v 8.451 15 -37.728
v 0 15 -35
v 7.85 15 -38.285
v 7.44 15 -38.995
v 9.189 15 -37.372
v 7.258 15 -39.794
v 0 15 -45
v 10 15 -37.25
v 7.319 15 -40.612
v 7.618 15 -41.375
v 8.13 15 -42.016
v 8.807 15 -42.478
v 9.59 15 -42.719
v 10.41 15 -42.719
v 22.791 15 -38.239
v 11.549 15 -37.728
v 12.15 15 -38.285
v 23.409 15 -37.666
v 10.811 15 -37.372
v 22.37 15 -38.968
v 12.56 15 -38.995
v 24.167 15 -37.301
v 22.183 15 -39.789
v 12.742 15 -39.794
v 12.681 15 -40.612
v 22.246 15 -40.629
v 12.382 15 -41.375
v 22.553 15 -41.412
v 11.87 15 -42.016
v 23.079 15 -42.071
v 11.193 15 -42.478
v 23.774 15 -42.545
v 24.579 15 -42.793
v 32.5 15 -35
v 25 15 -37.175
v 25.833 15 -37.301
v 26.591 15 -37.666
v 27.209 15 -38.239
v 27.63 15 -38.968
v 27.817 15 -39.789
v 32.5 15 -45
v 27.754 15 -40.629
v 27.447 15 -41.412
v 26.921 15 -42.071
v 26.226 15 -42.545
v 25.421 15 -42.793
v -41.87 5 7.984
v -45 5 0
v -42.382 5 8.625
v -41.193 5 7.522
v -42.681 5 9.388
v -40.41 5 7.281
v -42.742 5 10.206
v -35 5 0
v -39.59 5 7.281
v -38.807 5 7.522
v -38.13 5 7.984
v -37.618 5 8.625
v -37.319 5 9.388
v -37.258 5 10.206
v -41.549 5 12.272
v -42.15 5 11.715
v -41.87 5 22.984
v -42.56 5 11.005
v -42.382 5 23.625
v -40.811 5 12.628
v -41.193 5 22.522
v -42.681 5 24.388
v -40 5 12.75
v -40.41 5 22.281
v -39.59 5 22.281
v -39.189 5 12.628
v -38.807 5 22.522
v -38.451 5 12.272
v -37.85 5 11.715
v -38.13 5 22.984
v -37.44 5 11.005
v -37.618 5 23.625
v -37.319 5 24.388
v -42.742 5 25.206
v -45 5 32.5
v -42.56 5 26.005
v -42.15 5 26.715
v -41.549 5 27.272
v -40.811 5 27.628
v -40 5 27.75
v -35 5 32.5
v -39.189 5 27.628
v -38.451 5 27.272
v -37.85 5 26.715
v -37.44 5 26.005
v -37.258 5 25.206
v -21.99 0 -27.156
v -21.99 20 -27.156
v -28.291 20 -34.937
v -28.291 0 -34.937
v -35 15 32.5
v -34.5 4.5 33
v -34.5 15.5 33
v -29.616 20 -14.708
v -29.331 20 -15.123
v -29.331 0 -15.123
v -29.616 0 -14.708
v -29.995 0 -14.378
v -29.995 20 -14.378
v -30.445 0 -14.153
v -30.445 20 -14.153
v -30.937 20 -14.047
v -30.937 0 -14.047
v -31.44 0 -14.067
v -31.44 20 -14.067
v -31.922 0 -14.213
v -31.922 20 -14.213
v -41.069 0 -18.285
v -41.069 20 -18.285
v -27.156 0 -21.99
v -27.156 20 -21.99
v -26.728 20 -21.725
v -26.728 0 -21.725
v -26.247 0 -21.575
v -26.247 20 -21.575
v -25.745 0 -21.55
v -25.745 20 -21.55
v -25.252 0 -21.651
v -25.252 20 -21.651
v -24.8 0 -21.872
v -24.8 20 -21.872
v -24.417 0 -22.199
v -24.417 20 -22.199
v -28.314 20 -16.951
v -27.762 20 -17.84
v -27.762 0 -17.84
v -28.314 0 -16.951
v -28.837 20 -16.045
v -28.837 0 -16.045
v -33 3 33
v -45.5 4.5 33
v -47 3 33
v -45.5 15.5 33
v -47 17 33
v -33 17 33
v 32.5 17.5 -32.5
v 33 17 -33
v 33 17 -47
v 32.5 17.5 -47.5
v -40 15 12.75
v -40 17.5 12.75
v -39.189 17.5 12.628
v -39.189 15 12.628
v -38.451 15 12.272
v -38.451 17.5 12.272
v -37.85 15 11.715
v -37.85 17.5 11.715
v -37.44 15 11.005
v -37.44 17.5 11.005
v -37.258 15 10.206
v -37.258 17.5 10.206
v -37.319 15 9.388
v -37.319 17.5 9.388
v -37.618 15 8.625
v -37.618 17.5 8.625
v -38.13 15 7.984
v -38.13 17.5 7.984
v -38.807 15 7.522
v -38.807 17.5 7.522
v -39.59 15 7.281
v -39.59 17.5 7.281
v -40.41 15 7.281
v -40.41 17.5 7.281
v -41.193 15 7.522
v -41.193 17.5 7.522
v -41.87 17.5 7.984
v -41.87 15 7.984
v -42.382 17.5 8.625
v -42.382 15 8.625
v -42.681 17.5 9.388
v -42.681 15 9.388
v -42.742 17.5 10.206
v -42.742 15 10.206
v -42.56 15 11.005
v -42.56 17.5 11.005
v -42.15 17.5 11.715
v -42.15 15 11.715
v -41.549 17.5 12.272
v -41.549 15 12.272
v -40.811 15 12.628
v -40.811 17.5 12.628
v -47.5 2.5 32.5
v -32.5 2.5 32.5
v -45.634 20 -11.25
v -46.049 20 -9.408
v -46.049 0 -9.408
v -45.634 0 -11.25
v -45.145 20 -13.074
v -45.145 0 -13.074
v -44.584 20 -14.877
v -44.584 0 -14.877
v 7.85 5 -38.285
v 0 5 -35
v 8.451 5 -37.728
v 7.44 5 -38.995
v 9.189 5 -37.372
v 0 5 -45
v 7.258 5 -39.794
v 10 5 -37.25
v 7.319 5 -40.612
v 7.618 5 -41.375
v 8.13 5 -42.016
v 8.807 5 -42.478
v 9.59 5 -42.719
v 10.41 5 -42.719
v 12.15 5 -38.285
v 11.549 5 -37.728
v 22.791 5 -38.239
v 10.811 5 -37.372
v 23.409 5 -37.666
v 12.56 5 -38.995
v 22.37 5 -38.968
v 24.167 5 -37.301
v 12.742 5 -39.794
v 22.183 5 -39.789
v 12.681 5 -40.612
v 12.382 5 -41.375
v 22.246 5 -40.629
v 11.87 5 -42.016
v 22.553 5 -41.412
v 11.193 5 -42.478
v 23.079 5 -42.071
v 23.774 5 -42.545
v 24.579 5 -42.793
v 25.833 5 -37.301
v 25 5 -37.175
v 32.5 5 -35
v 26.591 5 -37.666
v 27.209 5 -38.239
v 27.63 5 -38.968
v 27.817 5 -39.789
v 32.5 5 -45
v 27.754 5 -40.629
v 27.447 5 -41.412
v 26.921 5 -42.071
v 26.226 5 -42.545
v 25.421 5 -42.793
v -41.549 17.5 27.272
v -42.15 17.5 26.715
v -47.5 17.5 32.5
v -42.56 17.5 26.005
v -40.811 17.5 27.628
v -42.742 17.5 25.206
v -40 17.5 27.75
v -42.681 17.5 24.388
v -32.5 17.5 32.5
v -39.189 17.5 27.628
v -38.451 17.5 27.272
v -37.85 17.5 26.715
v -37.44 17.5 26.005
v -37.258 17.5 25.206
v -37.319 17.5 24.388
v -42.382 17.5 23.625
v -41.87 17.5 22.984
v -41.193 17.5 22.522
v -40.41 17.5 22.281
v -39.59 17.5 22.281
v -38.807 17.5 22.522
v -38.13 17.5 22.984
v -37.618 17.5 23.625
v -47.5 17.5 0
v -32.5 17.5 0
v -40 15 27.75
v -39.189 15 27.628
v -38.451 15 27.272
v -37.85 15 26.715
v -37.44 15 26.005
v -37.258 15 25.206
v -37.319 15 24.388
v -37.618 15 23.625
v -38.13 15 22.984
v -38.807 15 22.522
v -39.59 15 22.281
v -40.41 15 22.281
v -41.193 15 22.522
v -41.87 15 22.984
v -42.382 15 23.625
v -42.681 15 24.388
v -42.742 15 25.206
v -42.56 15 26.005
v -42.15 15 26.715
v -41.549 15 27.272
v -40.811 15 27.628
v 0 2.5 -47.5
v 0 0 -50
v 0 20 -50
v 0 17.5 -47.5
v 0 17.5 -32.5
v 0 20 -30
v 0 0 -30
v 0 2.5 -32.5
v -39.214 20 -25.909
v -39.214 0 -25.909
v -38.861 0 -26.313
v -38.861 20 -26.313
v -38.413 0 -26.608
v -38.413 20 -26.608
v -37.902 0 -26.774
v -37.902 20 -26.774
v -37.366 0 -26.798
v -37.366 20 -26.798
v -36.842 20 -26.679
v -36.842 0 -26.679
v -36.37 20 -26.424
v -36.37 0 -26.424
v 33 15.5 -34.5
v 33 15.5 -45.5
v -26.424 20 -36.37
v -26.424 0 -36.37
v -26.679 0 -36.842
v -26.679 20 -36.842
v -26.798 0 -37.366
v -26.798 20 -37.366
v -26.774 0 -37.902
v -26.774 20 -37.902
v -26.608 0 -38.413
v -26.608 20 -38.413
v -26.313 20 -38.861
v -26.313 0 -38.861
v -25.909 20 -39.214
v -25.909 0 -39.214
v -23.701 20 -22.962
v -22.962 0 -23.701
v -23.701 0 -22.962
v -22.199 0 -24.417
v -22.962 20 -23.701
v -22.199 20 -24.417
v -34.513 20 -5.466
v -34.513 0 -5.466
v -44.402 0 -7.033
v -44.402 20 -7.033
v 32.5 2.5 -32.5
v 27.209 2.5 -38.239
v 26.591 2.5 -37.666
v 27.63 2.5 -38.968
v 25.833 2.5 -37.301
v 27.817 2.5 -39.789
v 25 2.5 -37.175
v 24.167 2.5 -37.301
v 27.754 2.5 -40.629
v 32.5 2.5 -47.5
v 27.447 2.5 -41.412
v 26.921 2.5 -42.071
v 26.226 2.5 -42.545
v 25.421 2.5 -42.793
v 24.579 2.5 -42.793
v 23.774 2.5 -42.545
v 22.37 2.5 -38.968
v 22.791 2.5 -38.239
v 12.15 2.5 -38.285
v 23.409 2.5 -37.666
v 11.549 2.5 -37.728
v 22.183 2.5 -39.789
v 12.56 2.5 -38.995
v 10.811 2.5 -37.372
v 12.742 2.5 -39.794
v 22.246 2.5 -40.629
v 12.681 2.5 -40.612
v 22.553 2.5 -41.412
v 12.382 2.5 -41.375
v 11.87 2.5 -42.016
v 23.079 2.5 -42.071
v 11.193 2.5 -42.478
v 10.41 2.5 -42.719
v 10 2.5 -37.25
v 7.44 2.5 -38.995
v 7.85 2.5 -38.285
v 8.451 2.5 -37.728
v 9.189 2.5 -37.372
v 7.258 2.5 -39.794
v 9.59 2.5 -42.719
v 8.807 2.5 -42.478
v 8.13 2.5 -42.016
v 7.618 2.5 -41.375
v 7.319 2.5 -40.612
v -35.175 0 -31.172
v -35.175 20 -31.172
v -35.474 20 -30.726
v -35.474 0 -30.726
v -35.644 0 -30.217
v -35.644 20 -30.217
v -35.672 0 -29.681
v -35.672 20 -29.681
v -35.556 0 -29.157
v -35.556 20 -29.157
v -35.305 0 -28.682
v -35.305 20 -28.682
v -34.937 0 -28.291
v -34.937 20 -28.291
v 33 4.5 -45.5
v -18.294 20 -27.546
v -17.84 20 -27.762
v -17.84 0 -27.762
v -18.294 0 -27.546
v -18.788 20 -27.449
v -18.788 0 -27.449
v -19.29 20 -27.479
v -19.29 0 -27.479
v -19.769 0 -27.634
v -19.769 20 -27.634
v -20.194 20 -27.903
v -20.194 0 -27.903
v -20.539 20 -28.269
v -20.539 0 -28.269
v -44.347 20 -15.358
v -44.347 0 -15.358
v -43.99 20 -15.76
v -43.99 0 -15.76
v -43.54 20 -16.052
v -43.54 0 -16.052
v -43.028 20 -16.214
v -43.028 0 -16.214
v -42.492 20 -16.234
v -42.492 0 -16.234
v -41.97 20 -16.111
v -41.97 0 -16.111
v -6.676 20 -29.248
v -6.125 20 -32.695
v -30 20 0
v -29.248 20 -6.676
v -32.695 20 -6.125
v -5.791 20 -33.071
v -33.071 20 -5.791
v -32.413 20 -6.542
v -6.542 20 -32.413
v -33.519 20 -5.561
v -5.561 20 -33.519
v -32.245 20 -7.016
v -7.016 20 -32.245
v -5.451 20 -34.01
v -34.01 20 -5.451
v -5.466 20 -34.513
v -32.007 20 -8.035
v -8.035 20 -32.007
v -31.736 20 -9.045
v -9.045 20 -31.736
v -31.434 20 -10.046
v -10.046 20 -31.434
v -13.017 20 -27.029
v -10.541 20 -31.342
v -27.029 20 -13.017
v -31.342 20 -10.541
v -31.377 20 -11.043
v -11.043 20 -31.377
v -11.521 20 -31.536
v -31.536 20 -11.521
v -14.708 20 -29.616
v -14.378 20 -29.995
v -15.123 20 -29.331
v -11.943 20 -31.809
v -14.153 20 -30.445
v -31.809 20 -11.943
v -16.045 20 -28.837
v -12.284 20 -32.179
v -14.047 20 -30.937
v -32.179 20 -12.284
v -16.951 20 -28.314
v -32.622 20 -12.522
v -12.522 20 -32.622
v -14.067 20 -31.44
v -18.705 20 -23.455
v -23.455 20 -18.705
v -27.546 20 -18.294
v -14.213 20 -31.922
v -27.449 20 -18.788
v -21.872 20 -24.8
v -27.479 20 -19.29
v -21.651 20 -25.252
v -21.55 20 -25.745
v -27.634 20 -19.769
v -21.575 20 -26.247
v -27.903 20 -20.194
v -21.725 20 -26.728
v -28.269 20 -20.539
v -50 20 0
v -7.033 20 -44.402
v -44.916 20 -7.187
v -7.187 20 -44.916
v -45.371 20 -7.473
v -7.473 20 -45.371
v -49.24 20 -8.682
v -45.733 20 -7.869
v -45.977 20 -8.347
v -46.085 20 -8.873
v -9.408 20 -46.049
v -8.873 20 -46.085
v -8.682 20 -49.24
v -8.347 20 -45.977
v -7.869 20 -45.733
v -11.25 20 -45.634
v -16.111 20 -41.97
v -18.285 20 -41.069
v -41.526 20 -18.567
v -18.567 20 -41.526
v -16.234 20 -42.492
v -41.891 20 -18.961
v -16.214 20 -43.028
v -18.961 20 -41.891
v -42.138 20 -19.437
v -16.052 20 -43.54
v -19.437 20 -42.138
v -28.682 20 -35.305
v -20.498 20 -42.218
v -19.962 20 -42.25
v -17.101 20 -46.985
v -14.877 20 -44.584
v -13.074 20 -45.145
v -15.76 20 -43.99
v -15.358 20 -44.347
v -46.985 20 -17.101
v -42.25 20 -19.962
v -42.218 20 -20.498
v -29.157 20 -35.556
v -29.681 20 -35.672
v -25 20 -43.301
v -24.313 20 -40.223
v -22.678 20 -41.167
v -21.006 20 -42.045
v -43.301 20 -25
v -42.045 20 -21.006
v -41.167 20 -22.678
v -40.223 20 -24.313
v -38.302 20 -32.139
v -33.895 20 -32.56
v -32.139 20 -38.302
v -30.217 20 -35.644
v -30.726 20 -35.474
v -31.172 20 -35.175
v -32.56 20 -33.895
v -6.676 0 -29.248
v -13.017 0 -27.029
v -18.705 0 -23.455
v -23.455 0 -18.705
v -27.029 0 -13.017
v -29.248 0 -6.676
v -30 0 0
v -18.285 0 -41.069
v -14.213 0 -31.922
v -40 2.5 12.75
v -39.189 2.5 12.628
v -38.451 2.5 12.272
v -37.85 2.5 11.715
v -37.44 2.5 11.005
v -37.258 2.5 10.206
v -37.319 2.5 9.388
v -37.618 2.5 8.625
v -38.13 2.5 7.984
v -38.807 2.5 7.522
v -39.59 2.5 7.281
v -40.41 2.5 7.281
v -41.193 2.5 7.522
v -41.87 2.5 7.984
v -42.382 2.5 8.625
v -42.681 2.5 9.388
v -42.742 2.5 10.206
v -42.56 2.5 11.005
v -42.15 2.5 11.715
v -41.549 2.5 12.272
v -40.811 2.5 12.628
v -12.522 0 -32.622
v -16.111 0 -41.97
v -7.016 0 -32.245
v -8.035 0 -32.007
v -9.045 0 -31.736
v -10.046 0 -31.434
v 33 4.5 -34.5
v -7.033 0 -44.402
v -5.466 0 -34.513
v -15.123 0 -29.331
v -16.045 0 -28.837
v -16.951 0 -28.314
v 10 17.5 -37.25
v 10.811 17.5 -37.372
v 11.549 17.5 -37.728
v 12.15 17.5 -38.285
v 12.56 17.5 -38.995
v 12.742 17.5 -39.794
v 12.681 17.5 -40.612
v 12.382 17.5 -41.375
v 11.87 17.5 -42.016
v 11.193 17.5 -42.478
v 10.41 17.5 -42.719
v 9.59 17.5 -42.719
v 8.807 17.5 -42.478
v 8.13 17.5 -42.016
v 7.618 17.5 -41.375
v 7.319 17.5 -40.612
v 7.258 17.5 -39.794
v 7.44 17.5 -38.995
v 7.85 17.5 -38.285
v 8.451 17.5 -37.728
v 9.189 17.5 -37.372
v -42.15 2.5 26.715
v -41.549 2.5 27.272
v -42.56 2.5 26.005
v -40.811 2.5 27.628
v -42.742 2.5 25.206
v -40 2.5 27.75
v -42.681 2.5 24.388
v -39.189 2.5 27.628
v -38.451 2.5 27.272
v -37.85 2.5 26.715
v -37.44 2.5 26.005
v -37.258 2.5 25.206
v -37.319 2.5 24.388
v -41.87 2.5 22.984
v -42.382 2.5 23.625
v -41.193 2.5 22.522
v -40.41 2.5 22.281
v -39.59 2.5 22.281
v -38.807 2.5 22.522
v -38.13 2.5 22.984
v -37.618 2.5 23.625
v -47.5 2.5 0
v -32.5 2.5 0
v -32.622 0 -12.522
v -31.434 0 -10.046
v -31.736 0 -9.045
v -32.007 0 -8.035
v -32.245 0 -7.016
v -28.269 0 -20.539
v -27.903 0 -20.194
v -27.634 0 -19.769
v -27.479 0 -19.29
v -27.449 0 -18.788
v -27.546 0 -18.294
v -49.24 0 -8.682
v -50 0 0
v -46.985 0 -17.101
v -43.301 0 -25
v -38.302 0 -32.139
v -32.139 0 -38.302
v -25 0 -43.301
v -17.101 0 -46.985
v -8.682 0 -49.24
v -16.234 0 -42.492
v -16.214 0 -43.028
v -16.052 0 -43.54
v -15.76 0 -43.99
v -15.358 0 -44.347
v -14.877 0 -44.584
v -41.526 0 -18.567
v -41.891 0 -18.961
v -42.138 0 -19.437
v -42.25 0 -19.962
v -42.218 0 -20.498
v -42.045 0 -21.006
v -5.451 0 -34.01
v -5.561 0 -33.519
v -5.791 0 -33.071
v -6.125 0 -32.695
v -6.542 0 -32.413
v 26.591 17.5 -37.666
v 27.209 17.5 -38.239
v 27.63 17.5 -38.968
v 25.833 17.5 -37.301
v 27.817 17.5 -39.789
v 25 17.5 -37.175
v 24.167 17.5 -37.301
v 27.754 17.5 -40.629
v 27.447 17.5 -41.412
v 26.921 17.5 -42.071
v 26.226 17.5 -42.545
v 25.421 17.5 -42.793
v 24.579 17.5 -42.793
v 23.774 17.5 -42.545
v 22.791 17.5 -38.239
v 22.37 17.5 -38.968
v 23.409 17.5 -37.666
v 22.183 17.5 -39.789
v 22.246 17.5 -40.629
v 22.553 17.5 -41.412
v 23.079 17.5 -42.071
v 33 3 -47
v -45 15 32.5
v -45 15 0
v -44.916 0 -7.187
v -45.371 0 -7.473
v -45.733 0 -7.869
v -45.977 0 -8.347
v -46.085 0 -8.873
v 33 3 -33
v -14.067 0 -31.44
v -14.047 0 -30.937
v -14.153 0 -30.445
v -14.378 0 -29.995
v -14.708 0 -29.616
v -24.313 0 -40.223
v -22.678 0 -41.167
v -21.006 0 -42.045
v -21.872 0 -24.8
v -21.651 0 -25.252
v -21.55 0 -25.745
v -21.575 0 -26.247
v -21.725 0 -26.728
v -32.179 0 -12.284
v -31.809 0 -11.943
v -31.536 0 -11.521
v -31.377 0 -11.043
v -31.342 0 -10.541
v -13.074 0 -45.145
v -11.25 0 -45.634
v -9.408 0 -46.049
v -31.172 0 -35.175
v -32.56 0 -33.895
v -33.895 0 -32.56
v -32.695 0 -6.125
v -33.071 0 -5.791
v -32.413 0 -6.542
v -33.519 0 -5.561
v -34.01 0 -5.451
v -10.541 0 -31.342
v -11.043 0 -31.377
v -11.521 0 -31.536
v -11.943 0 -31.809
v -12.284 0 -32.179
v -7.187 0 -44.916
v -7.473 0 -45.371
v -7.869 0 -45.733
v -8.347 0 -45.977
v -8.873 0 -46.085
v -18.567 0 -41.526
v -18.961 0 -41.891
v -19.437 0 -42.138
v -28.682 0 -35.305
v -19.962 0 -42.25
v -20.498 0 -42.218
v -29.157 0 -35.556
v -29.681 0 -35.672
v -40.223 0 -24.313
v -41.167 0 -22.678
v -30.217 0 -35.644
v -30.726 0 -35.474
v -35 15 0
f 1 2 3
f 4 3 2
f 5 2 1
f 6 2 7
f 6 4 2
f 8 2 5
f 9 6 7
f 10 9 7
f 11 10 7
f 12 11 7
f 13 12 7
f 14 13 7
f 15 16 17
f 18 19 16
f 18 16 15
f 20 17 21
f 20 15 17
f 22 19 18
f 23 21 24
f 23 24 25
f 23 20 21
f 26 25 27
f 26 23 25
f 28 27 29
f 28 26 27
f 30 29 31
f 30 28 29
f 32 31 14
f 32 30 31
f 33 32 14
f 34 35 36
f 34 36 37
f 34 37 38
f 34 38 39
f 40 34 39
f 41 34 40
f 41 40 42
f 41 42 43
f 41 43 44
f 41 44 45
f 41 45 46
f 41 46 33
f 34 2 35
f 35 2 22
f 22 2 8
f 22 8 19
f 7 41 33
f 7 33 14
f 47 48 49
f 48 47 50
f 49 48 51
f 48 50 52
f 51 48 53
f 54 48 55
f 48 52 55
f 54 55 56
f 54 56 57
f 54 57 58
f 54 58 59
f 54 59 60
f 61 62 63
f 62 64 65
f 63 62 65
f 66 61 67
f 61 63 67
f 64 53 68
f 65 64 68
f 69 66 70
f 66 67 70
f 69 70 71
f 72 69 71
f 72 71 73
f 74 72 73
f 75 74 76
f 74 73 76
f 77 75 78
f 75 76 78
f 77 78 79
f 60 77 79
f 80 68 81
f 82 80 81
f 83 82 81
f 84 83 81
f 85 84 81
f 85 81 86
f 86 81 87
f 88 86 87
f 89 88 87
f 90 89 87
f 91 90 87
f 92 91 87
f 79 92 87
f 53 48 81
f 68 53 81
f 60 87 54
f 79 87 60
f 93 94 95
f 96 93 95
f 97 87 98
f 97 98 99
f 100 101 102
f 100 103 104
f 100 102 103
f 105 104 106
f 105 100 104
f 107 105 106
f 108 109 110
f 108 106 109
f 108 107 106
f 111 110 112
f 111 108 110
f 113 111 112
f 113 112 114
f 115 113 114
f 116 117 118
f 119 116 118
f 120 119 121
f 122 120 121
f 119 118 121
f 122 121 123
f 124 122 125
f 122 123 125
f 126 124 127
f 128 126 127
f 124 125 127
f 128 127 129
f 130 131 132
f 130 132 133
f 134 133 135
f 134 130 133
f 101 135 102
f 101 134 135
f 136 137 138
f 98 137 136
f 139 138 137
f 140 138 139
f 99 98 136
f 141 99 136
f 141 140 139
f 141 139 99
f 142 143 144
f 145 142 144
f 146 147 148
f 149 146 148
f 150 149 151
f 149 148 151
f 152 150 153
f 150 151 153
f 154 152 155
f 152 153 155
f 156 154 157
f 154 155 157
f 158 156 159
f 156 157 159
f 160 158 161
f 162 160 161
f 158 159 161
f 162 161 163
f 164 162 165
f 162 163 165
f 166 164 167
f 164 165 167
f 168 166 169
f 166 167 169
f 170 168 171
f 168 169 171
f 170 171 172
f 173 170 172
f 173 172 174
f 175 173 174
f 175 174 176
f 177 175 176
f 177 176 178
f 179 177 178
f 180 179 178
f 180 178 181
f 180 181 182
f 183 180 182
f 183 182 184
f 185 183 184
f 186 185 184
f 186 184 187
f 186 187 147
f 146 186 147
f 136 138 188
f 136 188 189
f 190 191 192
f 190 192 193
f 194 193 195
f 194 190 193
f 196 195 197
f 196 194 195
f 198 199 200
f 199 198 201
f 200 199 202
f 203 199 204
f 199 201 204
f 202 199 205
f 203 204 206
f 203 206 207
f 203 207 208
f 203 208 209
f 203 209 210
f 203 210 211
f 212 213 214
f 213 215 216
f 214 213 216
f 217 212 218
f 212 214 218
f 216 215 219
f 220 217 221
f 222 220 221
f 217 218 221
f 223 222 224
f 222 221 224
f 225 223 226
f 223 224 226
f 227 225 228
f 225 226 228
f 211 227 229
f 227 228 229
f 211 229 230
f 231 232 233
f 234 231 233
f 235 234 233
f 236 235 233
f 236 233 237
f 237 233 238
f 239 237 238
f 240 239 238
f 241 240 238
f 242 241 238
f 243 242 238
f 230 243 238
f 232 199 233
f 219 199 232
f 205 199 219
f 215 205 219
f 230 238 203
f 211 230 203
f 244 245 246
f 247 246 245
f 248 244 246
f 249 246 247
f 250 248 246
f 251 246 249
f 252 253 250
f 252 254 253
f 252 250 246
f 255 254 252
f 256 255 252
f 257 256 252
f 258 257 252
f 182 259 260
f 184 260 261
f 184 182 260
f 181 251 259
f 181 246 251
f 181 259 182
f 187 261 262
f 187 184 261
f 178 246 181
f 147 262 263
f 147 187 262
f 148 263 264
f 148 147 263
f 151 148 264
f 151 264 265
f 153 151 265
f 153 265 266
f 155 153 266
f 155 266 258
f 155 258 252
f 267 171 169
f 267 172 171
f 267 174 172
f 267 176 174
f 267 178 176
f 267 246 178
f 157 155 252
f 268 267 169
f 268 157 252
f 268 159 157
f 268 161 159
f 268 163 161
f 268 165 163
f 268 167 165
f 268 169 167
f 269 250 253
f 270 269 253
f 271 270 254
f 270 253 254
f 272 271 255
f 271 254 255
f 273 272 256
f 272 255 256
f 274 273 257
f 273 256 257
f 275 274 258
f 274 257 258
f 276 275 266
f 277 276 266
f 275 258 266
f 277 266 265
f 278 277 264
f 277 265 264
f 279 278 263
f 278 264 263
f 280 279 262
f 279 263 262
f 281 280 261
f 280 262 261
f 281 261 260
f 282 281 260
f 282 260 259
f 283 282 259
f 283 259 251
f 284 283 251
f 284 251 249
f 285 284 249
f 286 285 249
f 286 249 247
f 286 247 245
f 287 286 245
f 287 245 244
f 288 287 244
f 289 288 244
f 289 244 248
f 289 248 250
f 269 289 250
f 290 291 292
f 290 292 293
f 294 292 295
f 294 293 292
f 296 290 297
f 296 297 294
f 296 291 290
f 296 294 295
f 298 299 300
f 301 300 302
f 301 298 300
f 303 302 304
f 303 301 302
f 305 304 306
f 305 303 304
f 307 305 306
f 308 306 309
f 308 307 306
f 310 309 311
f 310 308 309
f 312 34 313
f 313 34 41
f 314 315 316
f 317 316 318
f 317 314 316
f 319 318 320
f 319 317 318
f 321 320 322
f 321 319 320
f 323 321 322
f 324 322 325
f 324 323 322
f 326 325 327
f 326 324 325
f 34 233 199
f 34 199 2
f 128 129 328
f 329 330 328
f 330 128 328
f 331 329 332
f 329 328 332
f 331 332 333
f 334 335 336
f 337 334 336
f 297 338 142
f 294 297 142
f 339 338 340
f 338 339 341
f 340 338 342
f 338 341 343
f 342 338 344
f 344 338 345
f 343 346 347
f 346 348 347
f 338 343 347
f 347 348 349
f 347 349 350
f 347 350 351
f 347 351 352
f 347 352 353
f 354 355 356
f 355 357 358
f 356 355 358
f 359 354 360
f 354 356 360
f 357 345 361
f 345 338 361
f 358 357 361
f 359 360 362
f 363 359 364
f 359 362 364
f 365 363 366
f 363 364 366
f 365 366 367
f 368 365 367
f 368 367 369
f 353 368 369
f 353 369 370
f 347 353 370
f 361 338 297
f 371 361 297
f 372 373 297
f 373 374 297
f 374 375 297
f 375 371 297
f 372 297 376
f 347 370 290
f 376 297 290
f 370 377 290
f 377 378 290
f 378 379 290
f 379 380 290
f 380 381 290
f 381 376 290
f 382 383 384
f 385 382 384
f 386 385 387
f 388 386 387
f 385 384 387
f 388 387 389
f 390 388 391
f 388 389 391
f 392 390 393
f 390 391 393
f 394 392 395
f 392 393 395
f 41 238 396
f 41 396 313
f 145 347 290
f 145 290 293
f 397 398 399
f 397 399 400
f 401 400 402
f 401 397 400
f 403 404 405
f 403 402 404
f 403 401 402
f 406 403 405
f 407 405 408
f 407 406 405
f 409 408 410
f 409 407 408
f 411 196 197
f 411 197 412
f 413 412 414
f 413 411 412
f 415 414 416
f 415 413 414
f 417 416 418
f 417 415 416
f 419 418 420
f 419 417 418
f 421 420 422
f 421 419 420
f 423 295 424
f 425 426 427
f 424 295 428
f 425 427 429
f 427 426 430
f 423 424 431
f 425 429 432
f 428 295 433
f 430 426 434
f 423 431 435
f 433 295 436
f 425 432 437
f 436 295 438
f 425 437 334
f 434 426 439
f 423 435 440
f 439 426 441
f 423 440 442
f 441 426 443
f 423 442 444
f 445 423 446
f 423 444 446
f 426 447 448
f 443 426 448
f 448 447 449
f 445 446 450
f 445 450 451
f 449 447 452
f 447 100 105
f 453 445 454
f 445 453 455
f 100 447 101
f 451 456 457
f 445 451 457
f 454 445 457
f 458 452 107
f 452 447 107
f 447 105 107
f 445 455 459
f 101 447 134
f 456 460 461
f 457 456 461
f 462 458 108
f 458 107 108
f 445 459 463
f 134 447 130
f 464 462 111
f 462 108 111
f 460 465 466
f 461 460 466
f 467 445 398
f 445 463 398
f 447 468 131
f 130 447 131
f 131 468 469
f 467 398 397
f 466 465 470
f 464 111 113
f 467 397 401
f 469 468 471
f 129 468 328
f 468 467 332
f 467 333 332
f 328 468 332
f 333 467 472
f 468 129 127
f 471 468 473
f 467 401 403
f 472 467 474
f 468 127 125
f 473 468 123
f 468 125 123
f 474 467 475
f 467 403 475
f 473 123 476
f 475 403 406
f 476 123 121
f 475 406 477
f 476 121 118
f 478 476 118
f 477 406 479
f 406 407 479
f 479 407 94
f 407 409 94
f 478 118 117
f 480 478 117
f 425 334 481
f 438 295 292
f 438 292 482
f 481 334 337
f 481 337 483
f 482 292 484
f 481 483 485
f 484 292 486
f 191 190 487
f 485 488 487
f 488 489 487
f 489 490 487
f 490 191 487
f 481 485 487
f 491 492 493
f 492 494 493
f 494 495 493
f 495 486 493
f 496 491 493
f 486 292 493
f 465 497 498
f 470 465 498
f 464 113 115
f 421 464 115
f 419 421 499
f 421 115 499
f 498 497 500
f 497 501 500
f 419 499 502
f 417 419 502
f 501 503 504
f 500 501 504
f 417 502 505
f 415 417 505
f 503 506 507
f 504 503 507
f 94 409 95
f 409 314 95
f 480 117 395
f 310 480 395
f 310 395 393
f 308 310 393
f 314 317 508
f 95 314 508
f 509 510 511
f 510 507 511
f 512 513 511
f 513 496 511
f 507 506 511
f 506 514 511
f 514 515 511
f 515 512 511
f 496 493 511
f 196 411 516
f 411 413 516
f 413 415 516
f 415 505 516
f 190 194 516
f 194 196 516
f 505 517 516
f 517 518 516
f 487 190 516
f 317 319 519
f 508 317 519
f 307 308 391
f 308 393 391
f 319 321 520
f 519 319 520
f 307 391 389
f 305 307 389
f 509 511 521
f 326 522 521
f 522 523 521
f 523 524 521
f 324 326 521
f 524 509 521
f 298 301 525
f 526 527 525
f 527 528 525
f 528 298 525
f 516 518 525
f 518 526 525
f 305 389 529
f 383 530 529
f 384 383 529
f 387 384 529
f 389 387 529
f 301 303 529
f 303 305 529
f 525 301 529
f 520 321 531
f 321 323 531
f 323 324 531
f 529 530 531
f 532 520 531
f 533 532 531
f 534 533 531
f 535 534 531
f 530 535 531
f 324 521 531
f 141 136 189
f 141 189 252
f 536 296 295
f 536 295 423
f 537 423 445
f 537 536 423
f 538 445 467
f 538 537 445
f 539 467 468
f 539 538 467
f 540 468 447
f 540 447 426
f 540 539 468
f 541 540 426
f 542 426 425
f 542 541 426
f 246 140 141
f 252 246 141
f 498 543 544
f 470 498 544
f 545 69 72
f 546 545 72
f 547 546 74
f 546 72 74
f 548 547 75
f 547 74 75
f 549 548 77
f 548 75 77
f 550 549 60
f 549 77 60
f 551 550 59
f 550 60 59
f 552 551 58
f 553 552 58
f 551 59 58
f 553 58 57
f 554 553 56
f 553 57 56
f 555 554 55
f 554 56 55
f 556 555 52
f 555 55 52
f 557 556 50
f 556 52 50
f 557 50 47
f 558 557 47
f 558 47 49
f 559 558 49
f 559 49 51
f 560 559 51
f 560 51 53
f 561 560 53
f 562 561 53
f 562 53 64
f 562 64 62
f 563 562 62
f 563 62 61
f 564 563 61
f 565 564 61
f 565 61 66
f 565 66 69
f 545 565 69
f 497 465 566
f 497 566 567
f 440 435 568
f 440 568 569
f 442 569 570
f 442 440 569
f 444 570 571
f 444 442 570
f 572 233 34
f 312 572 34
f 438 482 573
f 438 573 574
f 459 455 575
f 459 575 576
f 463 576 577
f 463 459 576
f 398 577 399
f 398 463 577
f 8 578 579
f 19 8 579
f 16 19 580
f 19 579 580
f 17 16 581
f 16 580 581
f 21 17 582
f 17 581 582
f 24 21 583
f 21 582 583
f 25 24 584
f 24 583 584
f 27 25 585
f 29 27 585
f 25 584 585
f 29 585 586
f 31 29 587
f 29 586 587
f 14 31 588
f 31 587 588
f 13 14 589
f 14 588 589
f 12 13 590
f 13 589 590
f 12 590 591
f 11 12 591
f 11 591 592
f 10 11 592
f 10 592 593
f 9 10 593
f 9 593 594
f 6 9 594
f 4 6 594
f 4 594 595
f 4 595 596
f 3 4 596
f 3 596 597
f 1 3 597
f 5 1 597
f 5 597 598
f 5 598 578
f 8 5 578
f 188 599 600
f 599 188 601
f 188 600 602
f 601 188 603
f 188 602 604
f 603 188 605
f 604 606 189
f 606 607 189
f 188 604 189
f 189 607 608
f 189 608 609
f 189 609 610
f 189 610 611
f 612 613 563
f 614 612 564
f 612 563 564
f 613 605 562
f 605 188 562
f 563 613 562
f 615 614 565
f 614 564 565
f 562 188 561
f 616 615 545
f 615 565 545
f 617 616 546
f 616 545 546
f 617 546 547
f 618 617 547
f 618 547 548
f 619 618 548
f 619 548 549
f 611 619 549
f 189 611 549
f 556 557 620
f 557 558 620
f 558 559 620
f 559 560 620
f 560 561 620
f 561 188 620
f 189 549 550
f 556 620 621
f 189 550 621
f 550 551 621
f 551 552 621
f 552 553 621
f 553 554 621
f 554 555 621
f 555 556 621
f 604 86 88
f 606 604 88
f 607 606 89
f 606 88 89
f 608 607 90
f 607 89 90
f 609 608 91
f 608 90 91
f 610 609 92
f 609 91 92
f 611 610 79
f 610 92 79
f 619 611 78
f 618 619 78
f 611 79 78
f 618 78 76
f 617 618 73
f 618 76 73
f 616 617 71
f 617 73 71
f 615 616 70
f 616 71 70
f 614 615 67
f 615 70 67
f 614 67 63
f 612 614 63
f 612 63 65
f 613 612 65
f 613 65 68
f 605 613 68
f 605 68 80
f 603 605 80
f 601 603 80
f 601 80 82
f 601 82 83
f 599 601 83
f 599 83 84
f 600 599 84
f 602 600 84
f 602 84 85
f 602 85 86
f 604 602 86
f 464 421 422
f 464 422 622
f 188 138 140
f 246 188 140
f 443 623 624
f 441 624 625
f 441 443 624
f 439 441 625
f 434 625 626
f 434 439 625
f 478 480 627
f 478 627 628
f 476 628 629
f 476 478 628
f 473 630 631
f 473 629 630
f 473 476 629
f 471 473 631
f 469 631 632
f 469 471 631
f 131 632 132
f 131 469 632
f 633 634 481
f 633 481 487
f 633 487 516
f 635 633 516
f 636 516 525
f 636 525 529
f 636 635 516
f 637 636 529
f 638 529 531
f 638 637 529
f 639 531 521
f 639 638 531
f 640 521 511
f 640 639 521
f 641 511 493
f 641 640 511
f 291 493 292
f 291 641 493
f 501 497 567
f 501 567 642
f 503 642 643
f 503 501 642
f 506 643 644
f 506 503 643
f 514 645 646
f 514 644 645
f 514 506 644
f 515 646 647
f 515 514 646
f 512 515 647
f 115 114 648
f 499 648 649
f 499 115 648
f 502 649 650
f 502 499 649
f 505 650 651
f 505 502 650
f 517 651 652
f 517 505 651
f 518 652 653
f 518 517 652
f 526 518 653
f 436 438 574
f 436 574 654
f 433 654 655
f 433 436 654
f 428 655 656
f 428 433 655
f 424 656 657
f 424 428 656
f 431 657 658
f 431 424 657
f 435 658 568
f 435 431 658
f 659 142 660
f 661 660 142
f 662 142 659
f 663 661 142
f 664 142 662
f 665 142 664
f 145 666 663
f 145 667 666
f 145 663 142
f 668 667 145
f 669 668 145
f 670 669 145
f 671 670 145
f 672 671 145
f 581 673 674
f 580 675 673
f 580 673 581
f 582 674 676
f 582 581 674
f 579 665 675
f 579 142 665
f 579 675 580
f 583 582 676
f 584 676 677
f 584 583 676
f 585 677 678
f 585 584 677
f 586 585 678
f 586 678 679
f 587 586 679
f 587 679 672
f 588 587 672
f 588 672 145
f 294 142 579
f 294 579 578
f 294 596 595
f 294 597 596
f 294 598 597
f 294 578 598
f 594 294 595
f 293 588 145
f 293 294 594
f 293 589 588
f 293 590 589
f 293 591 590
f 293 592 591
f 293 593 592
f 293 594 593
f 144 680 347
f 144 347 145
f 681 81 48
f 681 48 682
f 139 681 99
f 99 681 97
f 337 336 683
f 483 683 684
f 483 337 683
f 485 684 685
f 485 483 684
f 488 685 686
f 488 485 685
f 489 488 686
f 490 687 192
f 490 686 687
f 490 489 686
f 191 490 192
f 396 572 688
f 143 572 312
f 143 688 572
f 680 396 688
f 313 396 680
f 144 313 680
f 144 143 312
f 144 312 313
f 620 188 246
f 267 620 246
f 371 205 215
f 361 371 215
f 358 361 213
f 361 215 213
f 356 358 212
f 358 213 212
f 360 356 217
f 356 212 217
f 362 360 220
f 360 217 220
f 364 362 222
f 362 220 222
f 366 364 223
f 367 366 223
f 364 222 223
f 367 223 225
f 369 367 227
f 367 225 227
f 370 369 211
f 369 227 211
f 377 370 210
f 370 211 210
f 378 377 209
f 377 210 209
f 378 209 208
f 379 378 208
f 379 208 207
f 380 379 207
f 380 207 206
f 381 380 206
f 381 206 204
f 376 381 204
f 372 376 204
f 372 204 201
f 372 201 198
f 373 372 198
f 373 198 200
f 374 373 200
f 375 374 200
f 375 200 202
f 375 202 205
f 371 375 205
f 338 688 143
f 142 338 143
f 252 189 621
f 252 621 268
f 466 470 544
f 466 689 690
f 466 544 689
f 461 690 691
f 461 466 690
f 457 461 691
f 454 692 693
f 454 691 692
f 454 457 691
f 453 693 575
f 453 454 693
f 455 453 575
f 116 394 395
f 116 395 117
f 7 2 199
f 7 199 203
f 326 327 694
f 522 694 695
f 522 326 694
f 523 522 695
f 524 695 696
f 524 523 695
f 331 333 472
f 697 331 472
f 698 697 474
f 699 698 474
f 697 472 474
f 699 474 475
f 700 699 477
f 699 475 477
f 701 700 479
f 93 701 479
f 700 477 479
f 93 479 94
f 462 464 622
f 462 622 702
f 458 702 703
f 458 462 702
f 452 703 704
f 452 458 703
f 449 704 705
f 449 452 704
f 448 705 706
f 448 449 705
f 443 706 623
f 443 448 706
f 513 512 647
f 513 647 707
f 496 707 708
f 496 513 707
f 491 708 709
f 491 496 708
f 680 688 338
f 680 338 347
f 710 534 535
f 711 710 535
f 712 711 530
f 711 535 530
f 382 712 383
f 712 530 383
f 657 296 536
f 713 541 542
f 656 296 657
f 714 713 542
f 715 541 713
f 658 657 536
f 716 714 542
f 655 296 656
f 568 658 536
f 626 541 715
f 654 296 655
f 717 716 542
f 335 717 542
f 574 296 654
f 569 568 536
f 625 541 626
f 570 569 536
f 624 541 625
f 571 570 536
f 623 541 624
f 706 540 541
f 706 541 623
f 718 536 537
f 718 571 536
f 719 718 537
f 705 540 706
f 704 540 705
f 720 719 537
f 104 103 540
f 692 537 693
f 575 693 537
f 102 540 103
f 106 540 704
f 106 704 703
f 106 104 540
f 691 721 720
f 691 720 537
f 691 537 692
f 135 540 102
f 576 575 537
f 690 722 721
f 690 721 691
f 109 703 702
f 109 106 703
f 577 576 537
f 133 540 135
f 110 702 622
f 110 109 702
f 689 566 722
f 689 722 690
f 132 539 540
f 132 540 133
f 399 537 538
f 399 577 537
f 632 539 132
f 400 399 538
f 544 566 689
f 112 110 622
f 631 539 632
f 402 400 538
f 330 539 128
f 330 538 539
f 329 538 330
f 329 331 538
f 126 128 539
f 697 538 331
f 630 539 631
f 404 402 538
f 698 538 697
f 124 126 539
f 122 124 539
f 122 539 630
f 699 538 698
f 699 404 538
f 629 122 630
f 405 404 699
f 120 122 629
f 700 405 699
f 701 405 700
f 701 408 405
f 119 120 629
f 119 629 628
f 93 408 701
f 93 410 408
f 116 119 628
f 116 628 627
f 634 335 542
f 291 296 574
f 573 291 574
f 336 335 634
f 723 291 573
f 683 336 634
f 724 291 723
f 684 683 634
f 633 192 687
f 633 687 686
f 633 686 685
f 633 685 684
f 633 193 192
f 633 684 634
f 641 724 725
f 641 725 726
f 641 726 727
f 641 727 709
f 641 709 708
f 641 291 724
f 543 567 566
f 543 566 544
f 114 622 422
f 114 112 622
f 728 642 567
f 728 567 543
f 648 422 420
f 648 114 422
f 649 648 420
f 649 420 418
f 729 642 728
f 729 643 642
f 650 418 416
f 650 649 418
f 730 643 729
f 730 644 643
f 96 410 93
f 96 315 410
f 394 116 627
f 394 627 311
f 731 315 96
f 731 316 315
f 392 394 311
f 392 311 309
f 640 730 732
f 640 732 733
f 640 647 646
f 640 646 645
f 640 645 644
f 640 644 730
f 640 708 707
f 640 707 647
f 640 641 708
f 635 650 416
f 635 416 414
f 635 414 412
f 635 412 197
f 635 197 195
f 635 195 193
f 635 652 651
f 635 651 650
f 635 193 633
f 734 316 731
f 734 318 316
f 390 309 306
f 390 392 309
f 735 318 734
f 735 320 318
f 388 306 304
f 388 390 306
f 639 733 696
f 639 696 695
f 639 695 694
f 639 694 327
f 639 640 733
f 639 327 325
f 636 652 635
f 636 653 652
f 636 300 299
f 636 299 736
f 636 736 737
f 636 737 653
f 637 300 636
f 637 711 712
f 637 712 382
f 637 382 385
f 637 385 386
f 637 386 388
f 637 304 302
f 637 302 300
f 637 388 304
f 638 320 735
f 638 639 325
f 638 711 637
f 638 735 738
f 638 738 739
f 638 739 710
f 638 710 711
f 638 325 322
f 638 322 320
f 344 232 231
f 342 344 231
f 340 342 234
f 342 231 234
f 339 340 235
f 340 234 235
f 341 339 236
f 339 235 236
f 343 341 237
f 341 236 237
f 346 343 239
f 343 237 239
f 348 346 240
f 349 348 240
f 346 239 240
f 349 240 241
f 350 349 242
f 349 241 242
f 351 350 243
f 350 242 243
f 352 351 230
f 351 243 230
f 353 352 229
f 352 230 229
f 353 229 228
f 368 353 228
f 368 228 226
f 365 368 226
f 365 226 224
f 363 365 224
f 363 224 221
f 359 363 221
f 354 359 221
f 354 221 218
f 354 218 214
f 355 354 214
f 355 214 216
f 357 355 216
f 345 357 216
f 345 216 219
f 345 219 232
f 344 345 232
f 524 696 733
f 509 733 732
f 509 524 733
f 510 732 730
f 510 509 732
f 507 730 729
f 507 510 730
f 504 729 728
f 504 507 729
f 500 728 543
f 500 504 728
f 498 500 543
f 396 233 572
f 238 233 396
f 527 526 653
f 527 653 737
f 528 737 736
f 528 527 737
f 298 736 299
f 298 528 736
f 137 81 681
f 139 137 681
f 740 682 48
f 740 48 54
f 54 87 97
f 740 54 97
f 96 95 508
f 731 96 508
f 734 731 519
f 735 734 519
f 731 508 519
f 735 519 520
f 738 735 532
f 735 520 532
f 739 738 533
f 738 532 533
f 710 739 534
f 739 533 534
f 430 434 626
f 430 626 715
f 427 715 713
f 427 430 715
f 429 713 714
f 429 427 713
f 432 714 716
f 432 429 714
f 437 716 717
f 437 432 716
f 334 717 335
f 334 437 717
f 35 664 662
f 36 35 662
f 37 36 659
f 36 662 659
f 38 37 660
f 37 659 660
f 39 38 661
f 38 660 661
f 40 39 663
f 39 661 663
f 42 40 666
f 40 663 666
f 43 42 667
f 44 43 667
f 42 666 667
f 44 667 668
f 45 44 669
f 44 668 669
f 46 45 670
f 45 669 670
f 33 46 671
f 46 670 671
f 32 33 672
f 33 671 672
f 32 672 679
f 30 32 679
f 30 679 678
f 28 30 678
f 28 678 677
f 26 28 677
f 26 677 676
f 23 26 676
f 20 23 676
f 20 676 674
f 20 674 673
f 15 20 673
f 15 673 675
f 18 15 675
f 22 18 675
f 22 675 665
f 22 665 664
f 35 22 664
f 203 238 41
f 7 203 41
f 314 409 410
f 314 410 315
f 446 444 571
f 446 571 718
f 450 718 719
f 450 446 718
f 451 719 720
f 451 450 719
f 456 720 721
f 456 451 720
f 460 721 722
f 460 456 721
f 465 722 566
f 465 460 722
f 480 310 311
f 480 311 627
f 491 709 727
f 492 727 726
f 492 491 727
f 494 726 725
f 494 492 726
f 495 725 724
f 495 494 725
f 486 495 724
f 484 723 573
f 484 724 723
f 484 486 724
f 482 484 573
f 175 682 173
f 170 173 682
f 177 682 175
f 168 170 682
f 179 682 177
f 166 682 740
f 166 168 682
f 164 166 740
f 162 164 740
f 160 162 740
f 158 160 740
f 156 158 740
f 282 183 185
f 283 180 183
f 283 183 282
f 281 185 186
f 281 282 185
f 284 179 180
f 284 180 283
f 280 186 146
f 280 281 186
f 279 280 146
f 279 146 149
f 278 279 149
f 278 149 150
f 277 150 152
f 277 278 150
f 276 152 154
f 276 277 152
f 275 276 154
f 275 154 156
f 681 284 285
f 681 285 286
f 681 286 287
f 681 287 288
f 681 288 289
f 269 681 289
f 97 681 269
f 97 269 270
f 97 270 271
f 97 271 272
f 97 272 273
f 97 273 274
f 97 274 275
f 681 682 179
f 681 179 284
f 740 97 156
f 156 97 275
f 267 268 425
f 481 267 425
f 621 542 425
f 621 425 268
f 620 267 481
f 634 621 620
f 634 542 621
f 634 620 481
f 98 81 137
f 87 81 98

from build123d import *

# Parameters (mm, degrees)
BOSS_EXTRUDE1_DEPTH = 20
SKETCH2_W           = 15
SKETCH2_H           = 15
BOSS_EXTRUDE2_DEPTH = 33
SKETCH3_W           = 15
SKETCH3_H           = 15
BOSS_EXTRUDE3_DEPTH = 33
SKETCH4_R           = 2.75
SKETCH4_R_2         = 2.825
CUT_EXTRUDE1_DEPTH  = 73.844011422
CUT_EXTRUDE2_DEPTH  = 74.484692283
SKETCH6_W           = 10
SKETCH6_H           = 10
CUT_EXTRUDE3_DEPTH  = 33
SKETCH7_W           = 10
SKETCH7_H           = 10
CUT_EXTRUDE4_DEPTH  = 33
CHAMFER1_SIZE       = 0.5


with BuildPart() as part:
    # Sketch1 → Boss-Extrude1 (new body)
    with BuildSketch(Plane(origin=(0, 0, 0), x_dir=(1, 0, 0), z_dir=(0, 1, 0))):
        with BuildLine():
            Line((0, 50), (0, 30))
            ThreePointArc((0, 30), (-21.213203436, 21.213203436), (-30, 0))
            Line((-30, 0), (-50, 0))
            ThreePointArc((-50, 0), (-35.355339059, 35.355339059), (0, 50))
        make_face()
    extrude(amount=BOSS_EXTRUDE1_DEPTH)

    # Sketch2 → Boss-Extrude2 (add)
    with BuildSketch(Plane.XY):
        with Locations((-40, 10)):
            Rectangle(SKETCH2_W, SKETCH2_H)
    extrude(amount=BOSS_EXTRUDE2_DEPTH)

    # Sketch3 → Boss-Extrude3 (add)
    with BuildSketch(Plane(origin=(0, 0, 0), x_dir=(0, 0, -1), z_dir=(1, 0, 0))):
        with Locations((40, 10)):
            Rectangle(SKETCH3_W, SKETCH3_H)
    extrude(amount=BOSS_EXTRUDE3_DEPTH)

    # Sketch4 → Cut-Extrude1 (cut, through all)
    with BuildSketch(Plane(origin=(0, 17.5, 0), x_dir=(1, 0, 0), z_dir=(0, 1, 0))):
        with Locations(Location((10, 40, 0), (0, 0, 270))):
            Circle(SKETCH4_R)
        with Locations(Location((25, 40, 0), (0, 0, 270))):
            Circle(SKETCH4_R_2)
        with Locations(Location((-40, -10, 0), (0, 0, 270))):
            Circle(SKETCH4_R)
        with Locations(Location((-40, -25, 0), (0, 0, 270))):
            Circle(SKETCH4_R)
    extrude(amount=-CUT_EXTRUDE1_DEPTH, mode=Mode.SUBTRACT)

    # Sketch5 → Cut-Extrude2 (cut, through all)
    with BuildSketch(Plane(origin=(0, 20, 0), x_dir=(1, 0, 0), z_dir=(0, 1, 0))):
        with BuildLine():
            Line((-21.990223117, 27.155663999), (-28.291433976, 34.937011371))
            ThreePointArc((-28.291433976, 34.937011371), (-29.68093252, 35.671569812), (-31.172202606, 35.17518706))
            ThreePointArc((-31.172202606, 35.17518706), (-33.234018716, 33.234018716), (-35.17518706, 31.172202606))
            ThreePointArc((-35.17518706, 31.172202606), (-35.671569812, 29.68093252), (-34.937011371, 28.291433976))
            Line((-34.937011371, 28.291433976), (-27.155663999, 21.990223117))
            ThreePointArc((-27.155663999, 21.990223117), (-25.744904759, 21.550308438), (-24.417193319, 22.199114181))
            ThreePointArc((-24.417193319, 22.199114181), (-23.334523779, 23.334523779), (-22.199114181, 24.417193319))
            ThreePointArc((-22.199114181, 24.417193319), (-21.550308438, 25.744904759), (-21.990223117, 27.155663999))
        make_face()
        with BuildLine():
            Line((-20.538868638, 28.26932746), (-26.424199651, 36.369790662))
            ThreePointArc((-26.424199651, 36.369790662), (-26.774099933, 37.902060905), (-25.908661914, 39.214043885))
            ThreePointArc((-25.908661914, 39.214043885), (-23.5, 40.703193978), (-21.006027233, 42.044581338))
            ThreePointArc((-21.006027233, 42.044581338), (-19.437097633, 42.138081158), (-18.285062818, 41.068923503))
            Line((-18.285062818, 41.068923503), (-14.21252141, 31.921845736))
            ThreePointArc((-14.21252141, 31.921845736), (-14.152727818, 30.445298653), (-15.123063049, 29.330751167))
            ThreePointArc((-15.123063049, 29.330751167), (-16.5, 28.578838325), (-17.839644098, 27.762332367))
            ThreePointArc((-17.839644098, 27.762332367), (-19.290038151, 27.47927115), (-20.538868638, 28.26932746))
        make_face()
        with BuildLine():
            Line((-12.522383321, 32.621923854), (-16.110622392, 41.969606219))
            ThreePointArc((-16.110622392, 41.969606219), (-16.05201939, 43.540226476), (-14.876504274, 44.583512878))
            ThreePointArc((-14.876504274, 44.583512878), (-12.16449512, 45.398513836), (-9.408325818, 46.04870688))
            ThreePointArc((-9.408325818, 46.04870688), (-7.868656664, 45.73295191), (-7.032594847, 44.402056368))
            Line((-7.032594847, 44.402056368), (-5.466259855, 34.512606439))
            ThreePointArc((-5.466259855, 34.512606439), (-5.790662187, 33.070895758), (-7.016400163, 32.245466794))
            ThreePointArc((-7.016400163, 32.245466794), (-8.541028488, 31.875552268), (-10.046352613, 31.433593482))
            ThreePointArc((-10.046352613, 31.433593482), (-11.52058732, 31.535566946), (-12.522383321, 32.621923854))
        make_face()
        with BuildLine():
            Line((-31.921845736, 14.21252141), (-41.068923503, 18.285062818))
            ThreePointArc((-41.068923503, 18.285062818), (-42.138081158, 19.437097633), (-42.044581338, 21.006027233))
            ThreePointArc((-42.044581338, 21.006027233), (-40.703193978, 23.5), (-39.214043885, 25.908661914))
            ThreePointArc((-39.214043885, 25.908661914), (-37.902060905, 26.774099933), (-36.369790662, 26.424199651))
            Line((-36.369790662, 26.424199651), (-28.26932746, 20.538868638))
            ThreePointArc((-28.26932746, 20.538868638), (-27.47927115, 19.290038151), (-27.762332367, 17.839644098))
            ThreePointArc((-27.762332367, 17.839644098), (-28.578838325, 16.5), (-29.330751167, 15.123063049))
            ThreePointArc((-29.330751167, 15.123063049), (-30.445298653, 14.152727818), (-31.921845736, 14.21252141))
        make_face()
        with BuildLine():
            Line((-34.512606439, 5.466259855), (-44.402056368, 7.032594847))
            ThreePointArc((-44.402056368, 7.032594847), (-45.73295191, 7.868656664), (-46.04870688, 9.408325818))
            ThreePointArc((-46.04870688, 9.408325818), (-45.398513836, 12.16449512), (-44.583512878, 14.876504274))
            ThreePointArc((-44.583512878, 14.876504274), (-43.540226476, 16.05201939), (-41.969606219, 16.110622392))
            Line((-41.969606219, 16.110622392), (-32.621923854, 12.522383321))
            ThreePointArc((-32.621923854, 12.522383321), (-31.535566946, 11.52058732), (-31.433593482, 10.046352613))
            ThreePointArc((-31.433593482, 10.046352613), (-31.875552268, 8.541028488), (-32.245466794, 7.016400163))
            ThreePointArc((-32.245466794, 7.016400163), (-33.070895758, 5.790662187), (-34.512606439, 5.466259855))
        make_face()
    extrude(amount=-CUT_EXTRUDE2_DEPTH, mode=Mode.SUBTRACT)

    # Sketch6 → Cut-Extrude3 (cut)
    with BuildSketch(Plane(origin=(33, 0, 0), x_dir=(0, 0, -1), z_dir=(1, 0, 0))):
        with Locations((40, 10)):
            Rectangle(SKETCH6_W, SKETCH6_H)
    extrude(amount=-CUT_EXTRUDE3_DEPTH, mode=Mode.SUBTRACT)

    # Sketch7 → Cut-Extrude4 (cut)
    with BuildSketch(Plane.XY.offset(33)):
        with Locations((-40, 10)):
            Rectangle(SKETCH7_W, SKETCH7_H)
    extrude(amount=-CUT_EXTRUDE4_DEPTH, mode=Mode.SUBTRACT)

    # Chamfer1
    chamfer1_edges = [part.edges().sort_by_distance(p)[0] for p in [
        (-32.5, 10, 33),
        (-40, 17.5, 33),
        (-47.5, 10, 33),
        (-40, 2.5, 33),
        (33, 10, -45),
        (33, 15, -40),
        (33, 10, -35),
        (33, 5, -40),
        (-35, 10, 33),
        (-40, 15, 33),
        (-45, 10, 33),
        (-40, 5, 33),
        (33, 10, -47.5),
        (33, 17.5, -40),
        (33, 10, -32.5),
        (33, 2.5, -40),
    ]]
    chamfer(chamfer1_edges, length=CHAMFER1_SIZE)


solid = part.part
